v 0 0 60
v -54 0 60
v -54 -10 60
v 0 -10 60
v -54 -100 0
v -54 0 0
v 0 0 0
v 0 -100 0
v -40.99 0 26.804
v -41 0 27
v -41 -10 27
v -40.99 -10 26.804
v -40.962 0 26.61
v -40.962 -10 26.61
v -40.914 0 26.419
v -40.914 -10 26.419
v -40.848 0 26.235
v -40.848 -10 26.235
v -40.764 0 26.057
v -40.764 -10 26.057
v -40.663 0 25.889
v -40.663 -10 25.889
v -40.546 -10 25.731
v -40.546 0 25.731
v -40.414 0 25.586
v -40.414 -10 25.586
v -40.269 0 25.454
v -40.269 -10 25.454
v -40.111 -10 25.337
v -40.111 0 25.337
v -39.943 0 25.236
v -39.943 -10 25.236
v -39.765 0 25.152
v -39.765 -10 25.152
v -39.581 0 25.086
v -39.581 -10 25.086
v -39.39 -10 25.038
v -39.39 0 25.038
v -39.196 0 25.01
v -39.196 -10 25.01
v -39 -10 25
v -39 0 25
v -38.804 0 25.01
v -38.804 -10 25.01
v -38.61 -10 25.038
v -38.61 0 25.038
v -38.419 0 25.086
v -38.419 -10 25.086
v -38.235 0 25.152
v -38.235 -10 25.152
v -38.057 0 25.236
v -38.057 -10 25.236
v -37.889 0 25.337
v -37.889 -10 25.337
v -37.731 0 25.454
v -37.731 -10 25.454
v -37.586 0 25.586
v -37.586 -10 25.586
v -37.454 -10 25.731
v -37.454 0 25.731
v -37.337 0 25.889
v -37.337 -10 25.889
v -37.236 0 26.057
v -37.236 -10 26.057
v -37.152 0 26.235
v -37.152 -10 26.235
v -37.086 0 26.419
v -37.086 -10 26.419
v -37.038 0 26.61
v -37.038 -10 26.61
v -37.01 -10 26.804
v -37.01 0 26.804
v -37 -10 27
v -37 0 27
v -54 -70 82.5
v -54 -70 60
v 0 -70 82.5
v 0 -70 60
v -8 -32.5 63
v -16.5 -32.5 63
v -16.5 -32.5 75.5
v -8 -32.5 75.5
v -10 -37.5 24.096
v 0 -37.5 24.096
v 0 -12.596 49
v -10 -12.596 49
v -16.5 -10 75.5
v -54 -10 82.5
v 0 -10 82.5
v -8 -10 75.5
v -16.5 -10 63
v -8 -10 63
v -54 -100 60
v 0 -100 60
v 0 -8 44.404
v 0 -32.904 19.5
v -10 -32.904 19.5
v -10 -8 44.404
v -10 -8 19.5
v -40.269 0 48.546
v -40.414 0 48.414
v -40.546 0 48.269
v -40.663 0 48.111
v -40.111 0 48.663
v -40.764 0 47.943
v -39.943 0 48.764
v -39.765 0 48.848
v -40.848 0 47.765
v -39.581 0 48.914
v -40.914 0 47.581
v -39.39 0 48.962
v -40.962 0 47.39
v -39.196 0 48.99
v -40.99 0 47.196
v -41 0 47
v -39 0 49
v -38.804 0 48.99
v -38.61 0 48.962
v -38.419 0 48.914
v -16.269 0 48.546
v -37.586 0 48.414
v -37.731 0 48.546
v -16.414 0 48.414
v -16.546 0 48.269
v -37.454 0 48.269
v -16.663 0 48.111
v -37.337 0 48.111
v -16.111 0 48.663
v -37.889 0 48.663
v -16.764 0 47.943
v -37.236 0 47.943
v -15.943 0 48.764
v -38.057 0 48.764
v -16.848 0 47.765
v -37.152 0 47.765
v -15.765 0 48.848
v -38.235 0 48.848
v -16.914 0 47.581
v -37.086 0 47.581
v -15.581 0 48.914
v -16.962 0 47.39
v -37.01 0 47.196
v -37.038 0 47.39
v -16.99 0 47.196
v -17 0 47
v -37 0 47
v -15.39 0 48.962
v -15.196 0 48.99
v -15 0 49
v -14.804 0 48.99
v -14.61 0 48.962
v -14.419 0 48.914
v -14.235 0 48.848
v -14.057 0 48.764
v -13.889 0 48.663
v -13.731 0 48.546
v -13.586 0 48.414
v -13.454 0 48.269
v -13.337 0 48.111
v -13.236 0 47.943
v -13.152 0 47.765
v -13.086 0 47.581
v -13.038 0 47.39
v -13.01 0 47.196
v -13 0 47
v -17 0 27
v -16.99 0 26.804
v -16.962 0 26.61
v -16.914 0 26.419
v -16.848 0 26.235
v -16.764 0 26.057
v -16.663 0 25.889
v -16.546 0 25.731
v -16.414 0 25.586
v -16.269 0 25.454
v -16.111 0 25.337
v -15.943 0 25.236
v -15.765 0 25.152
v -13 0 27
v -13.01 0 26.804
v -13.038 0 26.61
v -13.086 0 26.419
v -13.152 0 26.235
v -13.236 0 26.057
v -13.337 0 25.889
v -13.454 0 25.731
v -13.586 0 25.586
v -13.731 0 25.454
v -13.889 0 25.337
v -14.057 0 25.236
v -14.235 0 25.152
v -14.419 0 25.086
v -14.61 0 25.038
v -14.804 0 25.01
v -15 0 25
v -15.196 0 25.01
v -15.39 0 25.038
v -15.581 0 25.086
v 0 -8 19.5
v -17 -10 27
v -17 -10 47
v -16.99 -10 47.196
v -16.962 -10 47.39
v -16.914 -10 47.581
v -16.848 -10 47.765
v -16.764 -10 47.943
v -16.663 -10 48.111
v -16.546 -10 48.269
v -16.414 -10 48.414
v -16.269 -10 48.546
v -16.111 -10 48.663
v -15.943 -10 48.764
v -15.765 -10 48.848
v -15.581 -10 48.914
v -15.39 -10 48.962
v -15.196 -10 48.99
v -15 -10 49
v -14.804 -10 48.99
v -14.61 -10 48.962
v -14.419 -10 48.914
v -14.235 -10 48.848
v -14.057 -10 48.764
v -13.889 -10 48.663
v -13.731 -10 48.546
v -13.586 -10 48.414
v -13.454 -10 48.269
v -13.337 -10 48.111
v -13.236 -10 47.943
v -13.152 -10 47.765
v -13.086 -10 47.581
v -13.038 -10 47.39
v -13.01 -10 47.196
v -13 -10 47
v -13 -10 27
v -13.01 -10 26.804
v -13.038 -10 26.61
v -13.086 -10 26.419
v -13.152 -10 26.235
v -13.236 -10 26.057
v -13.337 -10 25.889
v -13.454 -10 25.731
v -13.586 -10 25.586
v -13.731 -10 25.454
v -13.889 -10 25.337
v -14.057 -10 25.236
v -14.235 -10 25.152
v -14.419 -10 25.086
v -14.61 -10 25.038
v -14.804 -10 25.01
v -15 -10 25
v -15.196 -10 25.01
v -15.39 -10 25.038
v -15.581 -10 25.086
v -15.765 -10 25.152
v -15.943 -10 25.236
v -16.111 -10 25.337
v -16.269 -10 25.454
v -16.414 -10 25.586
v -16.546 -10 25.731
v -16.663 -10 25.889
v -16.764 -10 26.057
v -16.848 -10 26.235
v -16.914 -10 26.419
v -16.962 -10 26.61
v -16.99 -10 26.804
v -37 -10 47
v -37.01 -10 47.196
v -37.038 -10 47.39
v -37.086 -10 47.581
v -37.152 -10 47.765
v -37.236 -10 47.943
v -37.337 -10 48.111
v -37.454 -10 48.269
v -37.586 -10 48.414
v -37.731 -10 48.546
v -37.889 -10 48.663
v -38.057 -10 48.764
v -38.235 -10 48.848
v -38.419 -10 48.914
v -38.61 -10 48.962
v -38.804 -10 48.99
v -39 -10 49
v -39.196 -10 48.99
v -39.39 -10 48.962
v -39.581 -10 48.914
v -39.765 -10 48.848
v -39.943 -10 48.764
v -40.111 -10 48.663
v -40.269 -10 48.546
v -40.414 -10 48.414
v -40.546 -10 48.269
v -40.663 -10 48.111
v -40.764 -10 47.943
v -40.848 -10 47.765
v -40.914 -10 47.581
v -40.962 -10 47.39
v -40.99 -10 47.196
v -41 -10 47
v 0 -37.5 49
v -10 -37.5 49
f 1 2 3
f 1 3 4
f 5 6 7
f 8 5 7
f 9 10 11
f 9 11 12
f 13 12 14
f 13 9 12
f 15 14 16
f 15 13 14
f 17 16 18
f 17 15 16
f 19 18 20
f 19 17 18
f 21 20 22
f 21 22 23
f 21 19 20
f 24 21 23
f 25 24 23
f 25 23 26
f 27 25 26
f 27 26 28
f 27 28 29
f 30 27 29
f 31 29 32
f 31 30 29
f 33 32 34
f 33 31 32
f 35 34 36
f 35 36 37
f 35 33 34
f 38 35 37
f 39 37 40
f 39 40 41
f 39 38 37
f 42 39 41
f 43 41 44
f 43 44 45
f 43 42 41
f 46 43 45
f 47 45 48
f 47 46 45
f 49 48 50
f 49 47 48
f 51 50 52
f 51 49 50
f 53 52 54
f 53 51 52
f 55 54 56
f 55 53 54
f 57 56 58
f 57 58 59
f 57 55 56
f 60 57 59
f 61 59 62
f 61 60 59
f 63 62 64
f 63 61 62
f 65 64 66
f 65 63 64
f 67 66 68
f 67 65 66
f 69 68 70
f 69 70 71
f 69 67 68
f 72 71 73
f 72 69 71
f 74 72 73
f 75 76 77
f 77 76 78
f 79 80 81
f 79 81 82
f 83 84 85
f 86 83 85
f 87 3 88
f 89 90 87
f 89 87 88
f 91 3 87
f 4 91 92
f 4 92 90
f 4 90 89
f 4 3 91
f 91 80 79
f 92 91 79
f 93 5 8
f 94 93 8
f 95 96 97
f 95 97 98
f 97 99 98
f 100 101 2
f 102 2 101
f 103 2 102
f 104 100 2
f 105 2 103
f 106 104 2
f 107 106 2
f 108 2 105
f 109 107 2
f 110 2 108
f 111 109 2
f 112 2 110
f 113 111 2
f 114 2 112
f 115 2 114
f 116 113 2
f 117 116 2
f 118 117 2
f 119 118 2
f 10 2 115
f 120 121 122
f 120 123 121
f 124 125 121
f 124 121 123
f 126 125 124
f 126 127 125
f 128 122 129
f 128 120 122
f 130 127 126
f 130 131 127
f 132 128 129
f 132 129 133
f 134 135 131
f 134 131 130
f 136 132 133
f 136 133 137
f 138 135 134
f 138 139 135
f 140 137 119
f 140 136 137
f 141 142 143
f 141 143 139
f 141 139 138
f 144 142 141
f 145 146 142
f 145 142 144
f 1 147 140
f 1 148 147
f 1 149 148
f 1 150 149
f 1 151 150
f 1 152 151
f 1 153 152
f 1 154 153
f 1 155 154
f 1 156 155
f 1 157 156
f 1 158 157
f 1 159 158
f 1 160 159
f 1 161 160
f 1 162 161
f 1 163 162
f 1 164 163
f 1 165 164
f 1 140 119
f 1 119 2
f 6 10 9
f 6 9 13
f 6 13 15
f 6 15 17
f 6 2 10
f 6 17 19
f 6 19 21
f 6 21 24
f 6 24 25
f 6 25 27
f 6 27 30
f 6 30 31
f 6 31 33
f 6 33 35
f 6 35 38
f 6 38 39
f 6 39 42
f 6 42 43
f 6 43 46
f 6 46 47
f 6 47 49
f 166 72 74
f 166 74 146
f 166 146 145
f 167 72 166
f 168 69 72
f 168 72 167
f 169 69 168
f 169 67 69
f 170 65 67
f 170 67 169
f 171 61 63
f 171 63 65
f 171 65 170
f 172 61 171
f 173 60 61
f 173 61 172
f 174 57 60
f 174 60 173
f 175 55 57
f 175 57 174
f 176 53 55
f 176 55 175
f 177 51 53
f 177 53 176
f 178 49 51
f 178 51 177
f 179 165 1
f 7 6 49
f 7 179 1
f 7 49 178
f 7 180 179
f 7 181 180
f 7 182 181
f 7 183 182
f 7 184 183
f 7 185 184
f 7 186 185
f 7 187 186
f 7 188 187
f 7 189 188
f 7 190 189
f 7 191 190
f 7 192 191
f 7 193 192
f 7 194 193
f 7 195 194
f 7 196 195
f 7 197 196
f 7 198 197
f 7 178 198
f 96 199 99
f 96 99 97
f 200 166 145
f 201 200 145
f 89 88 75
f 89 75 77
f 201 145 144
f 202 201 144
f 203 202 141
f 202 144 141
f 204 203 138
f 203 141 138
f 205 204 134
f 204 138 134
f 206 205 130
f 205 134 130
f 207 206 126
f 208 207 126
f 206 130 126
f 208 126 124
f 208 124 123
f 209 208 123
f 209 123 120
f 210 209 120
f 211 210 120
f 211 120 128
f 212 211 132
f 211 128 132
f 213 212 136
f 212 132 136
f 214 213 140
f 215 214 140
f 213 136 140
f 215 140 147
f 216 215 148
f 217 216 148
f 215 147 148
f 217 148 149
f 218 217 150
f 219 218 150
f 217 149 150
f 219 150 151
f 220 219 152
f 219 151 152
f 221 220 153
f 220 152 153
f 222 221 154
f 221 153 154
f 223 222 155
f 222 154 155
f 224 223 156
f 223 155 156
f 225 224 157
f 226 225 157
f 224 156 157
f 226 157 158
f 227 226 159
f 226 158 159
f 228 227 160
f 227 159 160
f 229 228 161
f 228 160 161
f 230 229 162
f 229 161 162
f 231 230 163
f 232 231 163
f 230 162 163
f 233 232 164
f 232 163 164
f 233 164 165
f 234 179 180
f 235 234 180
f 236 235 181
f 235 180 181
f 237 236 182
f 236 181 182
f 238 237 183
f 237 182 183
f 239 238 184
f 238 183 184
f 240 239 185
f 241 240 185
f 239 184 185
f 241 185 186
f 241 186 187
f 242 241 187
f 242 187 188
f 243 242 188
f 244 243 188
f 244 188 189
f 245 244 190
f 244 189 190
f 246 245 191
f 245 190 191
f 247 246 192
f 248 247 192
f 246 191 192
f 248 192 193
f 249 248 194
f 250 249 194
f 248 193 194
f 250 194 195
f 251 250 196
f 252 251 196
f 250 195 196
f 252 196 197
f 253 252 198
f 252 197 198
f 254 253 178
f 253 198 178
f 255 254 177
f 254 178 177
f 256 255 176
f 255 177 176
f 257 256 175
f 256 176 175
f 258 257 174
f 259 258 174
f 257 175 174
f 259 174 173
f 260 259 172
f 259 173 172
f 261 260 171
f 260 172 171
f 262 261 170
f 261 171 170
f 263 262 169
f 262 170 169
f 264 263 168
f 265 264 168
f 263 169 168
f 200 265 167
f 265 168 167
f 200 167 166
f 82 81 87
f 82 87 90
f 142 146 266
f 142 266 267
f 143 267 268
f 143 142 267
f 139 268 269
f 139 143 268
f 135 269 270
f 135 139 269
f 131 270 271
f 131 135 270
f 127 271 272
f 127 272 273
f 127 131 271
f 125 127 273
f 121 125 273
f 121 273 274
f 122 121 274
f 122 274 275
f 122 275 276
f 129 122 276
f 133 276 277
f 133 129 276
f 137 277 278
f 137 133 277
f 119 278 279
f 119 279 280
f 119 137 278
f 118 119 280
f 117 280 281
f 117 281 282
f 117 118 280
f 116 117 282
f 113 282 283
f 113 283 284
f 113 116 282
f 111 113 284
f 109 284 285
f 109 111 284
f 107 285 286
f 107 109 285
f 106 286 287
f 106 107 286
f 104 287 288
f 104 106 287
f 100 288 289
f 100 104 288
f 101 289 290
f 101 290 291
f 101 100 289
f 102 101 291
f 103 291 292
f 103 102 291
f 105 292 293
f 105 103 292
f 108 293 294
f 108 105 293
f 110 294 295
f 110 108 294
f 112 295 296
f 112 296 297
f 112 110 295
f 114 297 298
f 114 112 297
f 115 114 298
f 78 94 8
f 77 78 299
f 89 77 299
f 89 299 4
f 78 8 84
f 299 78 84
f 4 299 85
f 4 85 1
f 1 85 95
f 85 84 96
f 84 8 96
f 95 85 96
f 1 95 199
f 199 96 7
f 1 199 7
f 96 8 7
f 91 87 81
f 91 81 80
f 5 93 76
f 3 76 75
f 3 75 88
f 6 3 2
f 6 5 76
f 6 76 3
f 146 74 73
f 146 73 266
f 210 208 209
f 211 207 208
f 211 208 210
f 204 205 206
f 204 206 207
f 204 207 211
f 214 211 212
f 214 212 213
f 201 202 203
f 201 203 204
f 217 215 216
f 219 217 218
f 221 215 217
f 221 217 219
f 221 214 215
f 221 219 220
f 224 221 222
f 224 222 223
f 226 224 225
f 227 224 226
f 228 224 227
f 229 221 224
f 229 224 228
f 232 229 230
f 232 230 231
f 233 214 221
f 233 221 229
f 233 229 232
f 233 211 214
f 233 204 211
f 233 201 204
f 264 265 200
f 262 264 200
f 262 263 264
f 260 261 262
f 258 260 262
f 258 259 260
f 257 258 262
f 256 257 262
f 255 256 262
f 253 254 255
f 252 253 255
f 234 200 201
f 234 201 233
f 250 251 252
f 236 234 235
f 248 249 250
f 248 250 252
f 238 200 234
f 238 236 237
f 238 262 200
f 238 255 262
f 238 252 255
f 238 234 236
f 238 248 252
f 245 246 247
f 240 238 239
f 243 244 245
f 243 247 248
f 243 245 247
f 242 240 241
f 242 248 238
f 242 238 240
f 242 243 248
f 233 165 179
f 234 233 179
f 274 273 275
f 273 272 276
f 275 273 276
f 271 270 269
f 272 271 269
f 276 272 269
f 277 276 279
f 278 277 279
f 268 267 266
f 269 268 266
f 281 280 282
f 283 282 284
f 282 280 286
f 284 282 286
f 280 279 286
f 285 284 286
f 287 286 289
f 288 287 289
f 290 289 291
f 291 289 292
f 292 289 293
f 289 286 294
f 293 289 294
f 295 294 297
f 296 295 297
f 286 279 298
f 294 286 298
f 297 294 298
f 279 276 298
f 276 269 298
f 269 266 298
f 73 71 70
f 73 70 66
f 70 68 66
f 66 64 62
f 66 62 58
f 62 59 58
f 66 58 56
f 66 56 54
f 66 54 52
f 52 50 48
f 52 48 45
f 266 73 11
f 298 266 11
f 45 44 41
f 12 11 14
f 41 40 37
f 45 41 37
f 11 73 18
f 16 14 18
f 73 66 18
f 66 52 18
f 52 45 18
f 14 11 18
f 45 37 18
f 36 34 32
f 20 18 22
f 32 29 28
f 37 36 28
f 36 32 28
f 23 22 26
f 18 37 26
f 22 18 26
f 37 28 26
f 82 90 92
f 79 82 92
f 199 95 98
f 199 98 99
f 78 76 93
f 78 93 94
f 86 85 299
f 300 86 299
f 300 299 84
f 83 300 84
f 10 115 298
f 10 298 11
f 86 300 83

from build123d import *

# Parameters (mm, degrees)
SKETCH_1_W          = 54
SKETCH_1_H          = 100
EXTRUDE_1_DEPTH     = 60
SKETCH_2_W          = 54
SKETCH_2_H          = 60
EXTRUDE_2_DEPTH     = 22.5
SKETCH_3_W          = 8.5
SKETCH_3_H          = 12.5
CUT_EXTRUDE_1_DEPTH = 22.5
CUT_EXTRUDE_2_DEPTH = 10
CUT_EXTRUDE_3_DEPTH = 10


with BuildPart() as part:
    # 草图1 → 凸台-拉伸1 (new body)
    with BuildSketch(Plane.XY):
        with Locations((-27, -50)):
            Rectangle(SKETCH_1_W, SKETCH_1_H)
    extrude(amount=EXTRUDE_1_DEPTH)

    # 草图2 → 凸台-拉伸2 (add)
    with BuildSketch(Plane.XY.offset(60)):
        with Locations((-27, -40)):
            Rectangle(SKETCH_2_W, SKETCH_2_H)
    extrude(amount=EXTRUDE_2_DEPTH)

    # 草图3 → 切除-拉伸1 (cut)
    with BuildSketch(Plane(origin=(0, -10, 0), x_dir=(1, 0, 0), z_dir=(0, 1, 0))):
        with Locations((-12.25, -69.25)):
            Rectangle(SKETCH_3_W, SKETCH_3_H)
    extrude(amount=-CUT_EXTRUDE_1_DEPTH, mode=Mode.SUBTRACT)

    # 草图4 → 切除-拉伸2 (cut)
    with BuildSketch(Plane(origin=(0, 0, 0), x_dir=(1, 0, 0), z_dir=(0, 1, 0))):
        with BuildLine():
            Line((-37, -27), (-37, -47))
            ThreePointArc((-37, -47), (-39, -49), (-41, -47))
            Line((-41, -47), (-41, -27))
            ThreePointArc((-41, -27), (-39, -25), (-37, -27))
        make_face()
        with BuildLine():
            Line((-17, -27), (-17, -47))
            ThreePointArc((-17, -47), (-15, -49), (-13, -47))
            Line((-13, -47), (-13, -27))
            ThreePointArc((-13, -27), (-15, -25), (-17, -27))
        make_face()
    extrude(amount=-CUT_EXTRUDE_2_DEPTH, mode=Mode.SUBTRACT)

    # 草图5 → 切除-拉伸3 (cut)
    with BuildSketch(Plane(origin=(0, 0, 0), x_dir=(0, 0, -1), z_dir=(1, 0, 0))):
        Polygon((-44.403805922, -8), (-19.5, -8), (-19.5, -32.903805922), align=None)
        Polygon((-24.096194078, -37.5), (-49, -12.596194078), (-49, -37.5), align=None)
    extrude(amount=-CUT_EXTRUDE_3_DEPTH, mode=Mode.SUBTRACT)


solid = part.part
